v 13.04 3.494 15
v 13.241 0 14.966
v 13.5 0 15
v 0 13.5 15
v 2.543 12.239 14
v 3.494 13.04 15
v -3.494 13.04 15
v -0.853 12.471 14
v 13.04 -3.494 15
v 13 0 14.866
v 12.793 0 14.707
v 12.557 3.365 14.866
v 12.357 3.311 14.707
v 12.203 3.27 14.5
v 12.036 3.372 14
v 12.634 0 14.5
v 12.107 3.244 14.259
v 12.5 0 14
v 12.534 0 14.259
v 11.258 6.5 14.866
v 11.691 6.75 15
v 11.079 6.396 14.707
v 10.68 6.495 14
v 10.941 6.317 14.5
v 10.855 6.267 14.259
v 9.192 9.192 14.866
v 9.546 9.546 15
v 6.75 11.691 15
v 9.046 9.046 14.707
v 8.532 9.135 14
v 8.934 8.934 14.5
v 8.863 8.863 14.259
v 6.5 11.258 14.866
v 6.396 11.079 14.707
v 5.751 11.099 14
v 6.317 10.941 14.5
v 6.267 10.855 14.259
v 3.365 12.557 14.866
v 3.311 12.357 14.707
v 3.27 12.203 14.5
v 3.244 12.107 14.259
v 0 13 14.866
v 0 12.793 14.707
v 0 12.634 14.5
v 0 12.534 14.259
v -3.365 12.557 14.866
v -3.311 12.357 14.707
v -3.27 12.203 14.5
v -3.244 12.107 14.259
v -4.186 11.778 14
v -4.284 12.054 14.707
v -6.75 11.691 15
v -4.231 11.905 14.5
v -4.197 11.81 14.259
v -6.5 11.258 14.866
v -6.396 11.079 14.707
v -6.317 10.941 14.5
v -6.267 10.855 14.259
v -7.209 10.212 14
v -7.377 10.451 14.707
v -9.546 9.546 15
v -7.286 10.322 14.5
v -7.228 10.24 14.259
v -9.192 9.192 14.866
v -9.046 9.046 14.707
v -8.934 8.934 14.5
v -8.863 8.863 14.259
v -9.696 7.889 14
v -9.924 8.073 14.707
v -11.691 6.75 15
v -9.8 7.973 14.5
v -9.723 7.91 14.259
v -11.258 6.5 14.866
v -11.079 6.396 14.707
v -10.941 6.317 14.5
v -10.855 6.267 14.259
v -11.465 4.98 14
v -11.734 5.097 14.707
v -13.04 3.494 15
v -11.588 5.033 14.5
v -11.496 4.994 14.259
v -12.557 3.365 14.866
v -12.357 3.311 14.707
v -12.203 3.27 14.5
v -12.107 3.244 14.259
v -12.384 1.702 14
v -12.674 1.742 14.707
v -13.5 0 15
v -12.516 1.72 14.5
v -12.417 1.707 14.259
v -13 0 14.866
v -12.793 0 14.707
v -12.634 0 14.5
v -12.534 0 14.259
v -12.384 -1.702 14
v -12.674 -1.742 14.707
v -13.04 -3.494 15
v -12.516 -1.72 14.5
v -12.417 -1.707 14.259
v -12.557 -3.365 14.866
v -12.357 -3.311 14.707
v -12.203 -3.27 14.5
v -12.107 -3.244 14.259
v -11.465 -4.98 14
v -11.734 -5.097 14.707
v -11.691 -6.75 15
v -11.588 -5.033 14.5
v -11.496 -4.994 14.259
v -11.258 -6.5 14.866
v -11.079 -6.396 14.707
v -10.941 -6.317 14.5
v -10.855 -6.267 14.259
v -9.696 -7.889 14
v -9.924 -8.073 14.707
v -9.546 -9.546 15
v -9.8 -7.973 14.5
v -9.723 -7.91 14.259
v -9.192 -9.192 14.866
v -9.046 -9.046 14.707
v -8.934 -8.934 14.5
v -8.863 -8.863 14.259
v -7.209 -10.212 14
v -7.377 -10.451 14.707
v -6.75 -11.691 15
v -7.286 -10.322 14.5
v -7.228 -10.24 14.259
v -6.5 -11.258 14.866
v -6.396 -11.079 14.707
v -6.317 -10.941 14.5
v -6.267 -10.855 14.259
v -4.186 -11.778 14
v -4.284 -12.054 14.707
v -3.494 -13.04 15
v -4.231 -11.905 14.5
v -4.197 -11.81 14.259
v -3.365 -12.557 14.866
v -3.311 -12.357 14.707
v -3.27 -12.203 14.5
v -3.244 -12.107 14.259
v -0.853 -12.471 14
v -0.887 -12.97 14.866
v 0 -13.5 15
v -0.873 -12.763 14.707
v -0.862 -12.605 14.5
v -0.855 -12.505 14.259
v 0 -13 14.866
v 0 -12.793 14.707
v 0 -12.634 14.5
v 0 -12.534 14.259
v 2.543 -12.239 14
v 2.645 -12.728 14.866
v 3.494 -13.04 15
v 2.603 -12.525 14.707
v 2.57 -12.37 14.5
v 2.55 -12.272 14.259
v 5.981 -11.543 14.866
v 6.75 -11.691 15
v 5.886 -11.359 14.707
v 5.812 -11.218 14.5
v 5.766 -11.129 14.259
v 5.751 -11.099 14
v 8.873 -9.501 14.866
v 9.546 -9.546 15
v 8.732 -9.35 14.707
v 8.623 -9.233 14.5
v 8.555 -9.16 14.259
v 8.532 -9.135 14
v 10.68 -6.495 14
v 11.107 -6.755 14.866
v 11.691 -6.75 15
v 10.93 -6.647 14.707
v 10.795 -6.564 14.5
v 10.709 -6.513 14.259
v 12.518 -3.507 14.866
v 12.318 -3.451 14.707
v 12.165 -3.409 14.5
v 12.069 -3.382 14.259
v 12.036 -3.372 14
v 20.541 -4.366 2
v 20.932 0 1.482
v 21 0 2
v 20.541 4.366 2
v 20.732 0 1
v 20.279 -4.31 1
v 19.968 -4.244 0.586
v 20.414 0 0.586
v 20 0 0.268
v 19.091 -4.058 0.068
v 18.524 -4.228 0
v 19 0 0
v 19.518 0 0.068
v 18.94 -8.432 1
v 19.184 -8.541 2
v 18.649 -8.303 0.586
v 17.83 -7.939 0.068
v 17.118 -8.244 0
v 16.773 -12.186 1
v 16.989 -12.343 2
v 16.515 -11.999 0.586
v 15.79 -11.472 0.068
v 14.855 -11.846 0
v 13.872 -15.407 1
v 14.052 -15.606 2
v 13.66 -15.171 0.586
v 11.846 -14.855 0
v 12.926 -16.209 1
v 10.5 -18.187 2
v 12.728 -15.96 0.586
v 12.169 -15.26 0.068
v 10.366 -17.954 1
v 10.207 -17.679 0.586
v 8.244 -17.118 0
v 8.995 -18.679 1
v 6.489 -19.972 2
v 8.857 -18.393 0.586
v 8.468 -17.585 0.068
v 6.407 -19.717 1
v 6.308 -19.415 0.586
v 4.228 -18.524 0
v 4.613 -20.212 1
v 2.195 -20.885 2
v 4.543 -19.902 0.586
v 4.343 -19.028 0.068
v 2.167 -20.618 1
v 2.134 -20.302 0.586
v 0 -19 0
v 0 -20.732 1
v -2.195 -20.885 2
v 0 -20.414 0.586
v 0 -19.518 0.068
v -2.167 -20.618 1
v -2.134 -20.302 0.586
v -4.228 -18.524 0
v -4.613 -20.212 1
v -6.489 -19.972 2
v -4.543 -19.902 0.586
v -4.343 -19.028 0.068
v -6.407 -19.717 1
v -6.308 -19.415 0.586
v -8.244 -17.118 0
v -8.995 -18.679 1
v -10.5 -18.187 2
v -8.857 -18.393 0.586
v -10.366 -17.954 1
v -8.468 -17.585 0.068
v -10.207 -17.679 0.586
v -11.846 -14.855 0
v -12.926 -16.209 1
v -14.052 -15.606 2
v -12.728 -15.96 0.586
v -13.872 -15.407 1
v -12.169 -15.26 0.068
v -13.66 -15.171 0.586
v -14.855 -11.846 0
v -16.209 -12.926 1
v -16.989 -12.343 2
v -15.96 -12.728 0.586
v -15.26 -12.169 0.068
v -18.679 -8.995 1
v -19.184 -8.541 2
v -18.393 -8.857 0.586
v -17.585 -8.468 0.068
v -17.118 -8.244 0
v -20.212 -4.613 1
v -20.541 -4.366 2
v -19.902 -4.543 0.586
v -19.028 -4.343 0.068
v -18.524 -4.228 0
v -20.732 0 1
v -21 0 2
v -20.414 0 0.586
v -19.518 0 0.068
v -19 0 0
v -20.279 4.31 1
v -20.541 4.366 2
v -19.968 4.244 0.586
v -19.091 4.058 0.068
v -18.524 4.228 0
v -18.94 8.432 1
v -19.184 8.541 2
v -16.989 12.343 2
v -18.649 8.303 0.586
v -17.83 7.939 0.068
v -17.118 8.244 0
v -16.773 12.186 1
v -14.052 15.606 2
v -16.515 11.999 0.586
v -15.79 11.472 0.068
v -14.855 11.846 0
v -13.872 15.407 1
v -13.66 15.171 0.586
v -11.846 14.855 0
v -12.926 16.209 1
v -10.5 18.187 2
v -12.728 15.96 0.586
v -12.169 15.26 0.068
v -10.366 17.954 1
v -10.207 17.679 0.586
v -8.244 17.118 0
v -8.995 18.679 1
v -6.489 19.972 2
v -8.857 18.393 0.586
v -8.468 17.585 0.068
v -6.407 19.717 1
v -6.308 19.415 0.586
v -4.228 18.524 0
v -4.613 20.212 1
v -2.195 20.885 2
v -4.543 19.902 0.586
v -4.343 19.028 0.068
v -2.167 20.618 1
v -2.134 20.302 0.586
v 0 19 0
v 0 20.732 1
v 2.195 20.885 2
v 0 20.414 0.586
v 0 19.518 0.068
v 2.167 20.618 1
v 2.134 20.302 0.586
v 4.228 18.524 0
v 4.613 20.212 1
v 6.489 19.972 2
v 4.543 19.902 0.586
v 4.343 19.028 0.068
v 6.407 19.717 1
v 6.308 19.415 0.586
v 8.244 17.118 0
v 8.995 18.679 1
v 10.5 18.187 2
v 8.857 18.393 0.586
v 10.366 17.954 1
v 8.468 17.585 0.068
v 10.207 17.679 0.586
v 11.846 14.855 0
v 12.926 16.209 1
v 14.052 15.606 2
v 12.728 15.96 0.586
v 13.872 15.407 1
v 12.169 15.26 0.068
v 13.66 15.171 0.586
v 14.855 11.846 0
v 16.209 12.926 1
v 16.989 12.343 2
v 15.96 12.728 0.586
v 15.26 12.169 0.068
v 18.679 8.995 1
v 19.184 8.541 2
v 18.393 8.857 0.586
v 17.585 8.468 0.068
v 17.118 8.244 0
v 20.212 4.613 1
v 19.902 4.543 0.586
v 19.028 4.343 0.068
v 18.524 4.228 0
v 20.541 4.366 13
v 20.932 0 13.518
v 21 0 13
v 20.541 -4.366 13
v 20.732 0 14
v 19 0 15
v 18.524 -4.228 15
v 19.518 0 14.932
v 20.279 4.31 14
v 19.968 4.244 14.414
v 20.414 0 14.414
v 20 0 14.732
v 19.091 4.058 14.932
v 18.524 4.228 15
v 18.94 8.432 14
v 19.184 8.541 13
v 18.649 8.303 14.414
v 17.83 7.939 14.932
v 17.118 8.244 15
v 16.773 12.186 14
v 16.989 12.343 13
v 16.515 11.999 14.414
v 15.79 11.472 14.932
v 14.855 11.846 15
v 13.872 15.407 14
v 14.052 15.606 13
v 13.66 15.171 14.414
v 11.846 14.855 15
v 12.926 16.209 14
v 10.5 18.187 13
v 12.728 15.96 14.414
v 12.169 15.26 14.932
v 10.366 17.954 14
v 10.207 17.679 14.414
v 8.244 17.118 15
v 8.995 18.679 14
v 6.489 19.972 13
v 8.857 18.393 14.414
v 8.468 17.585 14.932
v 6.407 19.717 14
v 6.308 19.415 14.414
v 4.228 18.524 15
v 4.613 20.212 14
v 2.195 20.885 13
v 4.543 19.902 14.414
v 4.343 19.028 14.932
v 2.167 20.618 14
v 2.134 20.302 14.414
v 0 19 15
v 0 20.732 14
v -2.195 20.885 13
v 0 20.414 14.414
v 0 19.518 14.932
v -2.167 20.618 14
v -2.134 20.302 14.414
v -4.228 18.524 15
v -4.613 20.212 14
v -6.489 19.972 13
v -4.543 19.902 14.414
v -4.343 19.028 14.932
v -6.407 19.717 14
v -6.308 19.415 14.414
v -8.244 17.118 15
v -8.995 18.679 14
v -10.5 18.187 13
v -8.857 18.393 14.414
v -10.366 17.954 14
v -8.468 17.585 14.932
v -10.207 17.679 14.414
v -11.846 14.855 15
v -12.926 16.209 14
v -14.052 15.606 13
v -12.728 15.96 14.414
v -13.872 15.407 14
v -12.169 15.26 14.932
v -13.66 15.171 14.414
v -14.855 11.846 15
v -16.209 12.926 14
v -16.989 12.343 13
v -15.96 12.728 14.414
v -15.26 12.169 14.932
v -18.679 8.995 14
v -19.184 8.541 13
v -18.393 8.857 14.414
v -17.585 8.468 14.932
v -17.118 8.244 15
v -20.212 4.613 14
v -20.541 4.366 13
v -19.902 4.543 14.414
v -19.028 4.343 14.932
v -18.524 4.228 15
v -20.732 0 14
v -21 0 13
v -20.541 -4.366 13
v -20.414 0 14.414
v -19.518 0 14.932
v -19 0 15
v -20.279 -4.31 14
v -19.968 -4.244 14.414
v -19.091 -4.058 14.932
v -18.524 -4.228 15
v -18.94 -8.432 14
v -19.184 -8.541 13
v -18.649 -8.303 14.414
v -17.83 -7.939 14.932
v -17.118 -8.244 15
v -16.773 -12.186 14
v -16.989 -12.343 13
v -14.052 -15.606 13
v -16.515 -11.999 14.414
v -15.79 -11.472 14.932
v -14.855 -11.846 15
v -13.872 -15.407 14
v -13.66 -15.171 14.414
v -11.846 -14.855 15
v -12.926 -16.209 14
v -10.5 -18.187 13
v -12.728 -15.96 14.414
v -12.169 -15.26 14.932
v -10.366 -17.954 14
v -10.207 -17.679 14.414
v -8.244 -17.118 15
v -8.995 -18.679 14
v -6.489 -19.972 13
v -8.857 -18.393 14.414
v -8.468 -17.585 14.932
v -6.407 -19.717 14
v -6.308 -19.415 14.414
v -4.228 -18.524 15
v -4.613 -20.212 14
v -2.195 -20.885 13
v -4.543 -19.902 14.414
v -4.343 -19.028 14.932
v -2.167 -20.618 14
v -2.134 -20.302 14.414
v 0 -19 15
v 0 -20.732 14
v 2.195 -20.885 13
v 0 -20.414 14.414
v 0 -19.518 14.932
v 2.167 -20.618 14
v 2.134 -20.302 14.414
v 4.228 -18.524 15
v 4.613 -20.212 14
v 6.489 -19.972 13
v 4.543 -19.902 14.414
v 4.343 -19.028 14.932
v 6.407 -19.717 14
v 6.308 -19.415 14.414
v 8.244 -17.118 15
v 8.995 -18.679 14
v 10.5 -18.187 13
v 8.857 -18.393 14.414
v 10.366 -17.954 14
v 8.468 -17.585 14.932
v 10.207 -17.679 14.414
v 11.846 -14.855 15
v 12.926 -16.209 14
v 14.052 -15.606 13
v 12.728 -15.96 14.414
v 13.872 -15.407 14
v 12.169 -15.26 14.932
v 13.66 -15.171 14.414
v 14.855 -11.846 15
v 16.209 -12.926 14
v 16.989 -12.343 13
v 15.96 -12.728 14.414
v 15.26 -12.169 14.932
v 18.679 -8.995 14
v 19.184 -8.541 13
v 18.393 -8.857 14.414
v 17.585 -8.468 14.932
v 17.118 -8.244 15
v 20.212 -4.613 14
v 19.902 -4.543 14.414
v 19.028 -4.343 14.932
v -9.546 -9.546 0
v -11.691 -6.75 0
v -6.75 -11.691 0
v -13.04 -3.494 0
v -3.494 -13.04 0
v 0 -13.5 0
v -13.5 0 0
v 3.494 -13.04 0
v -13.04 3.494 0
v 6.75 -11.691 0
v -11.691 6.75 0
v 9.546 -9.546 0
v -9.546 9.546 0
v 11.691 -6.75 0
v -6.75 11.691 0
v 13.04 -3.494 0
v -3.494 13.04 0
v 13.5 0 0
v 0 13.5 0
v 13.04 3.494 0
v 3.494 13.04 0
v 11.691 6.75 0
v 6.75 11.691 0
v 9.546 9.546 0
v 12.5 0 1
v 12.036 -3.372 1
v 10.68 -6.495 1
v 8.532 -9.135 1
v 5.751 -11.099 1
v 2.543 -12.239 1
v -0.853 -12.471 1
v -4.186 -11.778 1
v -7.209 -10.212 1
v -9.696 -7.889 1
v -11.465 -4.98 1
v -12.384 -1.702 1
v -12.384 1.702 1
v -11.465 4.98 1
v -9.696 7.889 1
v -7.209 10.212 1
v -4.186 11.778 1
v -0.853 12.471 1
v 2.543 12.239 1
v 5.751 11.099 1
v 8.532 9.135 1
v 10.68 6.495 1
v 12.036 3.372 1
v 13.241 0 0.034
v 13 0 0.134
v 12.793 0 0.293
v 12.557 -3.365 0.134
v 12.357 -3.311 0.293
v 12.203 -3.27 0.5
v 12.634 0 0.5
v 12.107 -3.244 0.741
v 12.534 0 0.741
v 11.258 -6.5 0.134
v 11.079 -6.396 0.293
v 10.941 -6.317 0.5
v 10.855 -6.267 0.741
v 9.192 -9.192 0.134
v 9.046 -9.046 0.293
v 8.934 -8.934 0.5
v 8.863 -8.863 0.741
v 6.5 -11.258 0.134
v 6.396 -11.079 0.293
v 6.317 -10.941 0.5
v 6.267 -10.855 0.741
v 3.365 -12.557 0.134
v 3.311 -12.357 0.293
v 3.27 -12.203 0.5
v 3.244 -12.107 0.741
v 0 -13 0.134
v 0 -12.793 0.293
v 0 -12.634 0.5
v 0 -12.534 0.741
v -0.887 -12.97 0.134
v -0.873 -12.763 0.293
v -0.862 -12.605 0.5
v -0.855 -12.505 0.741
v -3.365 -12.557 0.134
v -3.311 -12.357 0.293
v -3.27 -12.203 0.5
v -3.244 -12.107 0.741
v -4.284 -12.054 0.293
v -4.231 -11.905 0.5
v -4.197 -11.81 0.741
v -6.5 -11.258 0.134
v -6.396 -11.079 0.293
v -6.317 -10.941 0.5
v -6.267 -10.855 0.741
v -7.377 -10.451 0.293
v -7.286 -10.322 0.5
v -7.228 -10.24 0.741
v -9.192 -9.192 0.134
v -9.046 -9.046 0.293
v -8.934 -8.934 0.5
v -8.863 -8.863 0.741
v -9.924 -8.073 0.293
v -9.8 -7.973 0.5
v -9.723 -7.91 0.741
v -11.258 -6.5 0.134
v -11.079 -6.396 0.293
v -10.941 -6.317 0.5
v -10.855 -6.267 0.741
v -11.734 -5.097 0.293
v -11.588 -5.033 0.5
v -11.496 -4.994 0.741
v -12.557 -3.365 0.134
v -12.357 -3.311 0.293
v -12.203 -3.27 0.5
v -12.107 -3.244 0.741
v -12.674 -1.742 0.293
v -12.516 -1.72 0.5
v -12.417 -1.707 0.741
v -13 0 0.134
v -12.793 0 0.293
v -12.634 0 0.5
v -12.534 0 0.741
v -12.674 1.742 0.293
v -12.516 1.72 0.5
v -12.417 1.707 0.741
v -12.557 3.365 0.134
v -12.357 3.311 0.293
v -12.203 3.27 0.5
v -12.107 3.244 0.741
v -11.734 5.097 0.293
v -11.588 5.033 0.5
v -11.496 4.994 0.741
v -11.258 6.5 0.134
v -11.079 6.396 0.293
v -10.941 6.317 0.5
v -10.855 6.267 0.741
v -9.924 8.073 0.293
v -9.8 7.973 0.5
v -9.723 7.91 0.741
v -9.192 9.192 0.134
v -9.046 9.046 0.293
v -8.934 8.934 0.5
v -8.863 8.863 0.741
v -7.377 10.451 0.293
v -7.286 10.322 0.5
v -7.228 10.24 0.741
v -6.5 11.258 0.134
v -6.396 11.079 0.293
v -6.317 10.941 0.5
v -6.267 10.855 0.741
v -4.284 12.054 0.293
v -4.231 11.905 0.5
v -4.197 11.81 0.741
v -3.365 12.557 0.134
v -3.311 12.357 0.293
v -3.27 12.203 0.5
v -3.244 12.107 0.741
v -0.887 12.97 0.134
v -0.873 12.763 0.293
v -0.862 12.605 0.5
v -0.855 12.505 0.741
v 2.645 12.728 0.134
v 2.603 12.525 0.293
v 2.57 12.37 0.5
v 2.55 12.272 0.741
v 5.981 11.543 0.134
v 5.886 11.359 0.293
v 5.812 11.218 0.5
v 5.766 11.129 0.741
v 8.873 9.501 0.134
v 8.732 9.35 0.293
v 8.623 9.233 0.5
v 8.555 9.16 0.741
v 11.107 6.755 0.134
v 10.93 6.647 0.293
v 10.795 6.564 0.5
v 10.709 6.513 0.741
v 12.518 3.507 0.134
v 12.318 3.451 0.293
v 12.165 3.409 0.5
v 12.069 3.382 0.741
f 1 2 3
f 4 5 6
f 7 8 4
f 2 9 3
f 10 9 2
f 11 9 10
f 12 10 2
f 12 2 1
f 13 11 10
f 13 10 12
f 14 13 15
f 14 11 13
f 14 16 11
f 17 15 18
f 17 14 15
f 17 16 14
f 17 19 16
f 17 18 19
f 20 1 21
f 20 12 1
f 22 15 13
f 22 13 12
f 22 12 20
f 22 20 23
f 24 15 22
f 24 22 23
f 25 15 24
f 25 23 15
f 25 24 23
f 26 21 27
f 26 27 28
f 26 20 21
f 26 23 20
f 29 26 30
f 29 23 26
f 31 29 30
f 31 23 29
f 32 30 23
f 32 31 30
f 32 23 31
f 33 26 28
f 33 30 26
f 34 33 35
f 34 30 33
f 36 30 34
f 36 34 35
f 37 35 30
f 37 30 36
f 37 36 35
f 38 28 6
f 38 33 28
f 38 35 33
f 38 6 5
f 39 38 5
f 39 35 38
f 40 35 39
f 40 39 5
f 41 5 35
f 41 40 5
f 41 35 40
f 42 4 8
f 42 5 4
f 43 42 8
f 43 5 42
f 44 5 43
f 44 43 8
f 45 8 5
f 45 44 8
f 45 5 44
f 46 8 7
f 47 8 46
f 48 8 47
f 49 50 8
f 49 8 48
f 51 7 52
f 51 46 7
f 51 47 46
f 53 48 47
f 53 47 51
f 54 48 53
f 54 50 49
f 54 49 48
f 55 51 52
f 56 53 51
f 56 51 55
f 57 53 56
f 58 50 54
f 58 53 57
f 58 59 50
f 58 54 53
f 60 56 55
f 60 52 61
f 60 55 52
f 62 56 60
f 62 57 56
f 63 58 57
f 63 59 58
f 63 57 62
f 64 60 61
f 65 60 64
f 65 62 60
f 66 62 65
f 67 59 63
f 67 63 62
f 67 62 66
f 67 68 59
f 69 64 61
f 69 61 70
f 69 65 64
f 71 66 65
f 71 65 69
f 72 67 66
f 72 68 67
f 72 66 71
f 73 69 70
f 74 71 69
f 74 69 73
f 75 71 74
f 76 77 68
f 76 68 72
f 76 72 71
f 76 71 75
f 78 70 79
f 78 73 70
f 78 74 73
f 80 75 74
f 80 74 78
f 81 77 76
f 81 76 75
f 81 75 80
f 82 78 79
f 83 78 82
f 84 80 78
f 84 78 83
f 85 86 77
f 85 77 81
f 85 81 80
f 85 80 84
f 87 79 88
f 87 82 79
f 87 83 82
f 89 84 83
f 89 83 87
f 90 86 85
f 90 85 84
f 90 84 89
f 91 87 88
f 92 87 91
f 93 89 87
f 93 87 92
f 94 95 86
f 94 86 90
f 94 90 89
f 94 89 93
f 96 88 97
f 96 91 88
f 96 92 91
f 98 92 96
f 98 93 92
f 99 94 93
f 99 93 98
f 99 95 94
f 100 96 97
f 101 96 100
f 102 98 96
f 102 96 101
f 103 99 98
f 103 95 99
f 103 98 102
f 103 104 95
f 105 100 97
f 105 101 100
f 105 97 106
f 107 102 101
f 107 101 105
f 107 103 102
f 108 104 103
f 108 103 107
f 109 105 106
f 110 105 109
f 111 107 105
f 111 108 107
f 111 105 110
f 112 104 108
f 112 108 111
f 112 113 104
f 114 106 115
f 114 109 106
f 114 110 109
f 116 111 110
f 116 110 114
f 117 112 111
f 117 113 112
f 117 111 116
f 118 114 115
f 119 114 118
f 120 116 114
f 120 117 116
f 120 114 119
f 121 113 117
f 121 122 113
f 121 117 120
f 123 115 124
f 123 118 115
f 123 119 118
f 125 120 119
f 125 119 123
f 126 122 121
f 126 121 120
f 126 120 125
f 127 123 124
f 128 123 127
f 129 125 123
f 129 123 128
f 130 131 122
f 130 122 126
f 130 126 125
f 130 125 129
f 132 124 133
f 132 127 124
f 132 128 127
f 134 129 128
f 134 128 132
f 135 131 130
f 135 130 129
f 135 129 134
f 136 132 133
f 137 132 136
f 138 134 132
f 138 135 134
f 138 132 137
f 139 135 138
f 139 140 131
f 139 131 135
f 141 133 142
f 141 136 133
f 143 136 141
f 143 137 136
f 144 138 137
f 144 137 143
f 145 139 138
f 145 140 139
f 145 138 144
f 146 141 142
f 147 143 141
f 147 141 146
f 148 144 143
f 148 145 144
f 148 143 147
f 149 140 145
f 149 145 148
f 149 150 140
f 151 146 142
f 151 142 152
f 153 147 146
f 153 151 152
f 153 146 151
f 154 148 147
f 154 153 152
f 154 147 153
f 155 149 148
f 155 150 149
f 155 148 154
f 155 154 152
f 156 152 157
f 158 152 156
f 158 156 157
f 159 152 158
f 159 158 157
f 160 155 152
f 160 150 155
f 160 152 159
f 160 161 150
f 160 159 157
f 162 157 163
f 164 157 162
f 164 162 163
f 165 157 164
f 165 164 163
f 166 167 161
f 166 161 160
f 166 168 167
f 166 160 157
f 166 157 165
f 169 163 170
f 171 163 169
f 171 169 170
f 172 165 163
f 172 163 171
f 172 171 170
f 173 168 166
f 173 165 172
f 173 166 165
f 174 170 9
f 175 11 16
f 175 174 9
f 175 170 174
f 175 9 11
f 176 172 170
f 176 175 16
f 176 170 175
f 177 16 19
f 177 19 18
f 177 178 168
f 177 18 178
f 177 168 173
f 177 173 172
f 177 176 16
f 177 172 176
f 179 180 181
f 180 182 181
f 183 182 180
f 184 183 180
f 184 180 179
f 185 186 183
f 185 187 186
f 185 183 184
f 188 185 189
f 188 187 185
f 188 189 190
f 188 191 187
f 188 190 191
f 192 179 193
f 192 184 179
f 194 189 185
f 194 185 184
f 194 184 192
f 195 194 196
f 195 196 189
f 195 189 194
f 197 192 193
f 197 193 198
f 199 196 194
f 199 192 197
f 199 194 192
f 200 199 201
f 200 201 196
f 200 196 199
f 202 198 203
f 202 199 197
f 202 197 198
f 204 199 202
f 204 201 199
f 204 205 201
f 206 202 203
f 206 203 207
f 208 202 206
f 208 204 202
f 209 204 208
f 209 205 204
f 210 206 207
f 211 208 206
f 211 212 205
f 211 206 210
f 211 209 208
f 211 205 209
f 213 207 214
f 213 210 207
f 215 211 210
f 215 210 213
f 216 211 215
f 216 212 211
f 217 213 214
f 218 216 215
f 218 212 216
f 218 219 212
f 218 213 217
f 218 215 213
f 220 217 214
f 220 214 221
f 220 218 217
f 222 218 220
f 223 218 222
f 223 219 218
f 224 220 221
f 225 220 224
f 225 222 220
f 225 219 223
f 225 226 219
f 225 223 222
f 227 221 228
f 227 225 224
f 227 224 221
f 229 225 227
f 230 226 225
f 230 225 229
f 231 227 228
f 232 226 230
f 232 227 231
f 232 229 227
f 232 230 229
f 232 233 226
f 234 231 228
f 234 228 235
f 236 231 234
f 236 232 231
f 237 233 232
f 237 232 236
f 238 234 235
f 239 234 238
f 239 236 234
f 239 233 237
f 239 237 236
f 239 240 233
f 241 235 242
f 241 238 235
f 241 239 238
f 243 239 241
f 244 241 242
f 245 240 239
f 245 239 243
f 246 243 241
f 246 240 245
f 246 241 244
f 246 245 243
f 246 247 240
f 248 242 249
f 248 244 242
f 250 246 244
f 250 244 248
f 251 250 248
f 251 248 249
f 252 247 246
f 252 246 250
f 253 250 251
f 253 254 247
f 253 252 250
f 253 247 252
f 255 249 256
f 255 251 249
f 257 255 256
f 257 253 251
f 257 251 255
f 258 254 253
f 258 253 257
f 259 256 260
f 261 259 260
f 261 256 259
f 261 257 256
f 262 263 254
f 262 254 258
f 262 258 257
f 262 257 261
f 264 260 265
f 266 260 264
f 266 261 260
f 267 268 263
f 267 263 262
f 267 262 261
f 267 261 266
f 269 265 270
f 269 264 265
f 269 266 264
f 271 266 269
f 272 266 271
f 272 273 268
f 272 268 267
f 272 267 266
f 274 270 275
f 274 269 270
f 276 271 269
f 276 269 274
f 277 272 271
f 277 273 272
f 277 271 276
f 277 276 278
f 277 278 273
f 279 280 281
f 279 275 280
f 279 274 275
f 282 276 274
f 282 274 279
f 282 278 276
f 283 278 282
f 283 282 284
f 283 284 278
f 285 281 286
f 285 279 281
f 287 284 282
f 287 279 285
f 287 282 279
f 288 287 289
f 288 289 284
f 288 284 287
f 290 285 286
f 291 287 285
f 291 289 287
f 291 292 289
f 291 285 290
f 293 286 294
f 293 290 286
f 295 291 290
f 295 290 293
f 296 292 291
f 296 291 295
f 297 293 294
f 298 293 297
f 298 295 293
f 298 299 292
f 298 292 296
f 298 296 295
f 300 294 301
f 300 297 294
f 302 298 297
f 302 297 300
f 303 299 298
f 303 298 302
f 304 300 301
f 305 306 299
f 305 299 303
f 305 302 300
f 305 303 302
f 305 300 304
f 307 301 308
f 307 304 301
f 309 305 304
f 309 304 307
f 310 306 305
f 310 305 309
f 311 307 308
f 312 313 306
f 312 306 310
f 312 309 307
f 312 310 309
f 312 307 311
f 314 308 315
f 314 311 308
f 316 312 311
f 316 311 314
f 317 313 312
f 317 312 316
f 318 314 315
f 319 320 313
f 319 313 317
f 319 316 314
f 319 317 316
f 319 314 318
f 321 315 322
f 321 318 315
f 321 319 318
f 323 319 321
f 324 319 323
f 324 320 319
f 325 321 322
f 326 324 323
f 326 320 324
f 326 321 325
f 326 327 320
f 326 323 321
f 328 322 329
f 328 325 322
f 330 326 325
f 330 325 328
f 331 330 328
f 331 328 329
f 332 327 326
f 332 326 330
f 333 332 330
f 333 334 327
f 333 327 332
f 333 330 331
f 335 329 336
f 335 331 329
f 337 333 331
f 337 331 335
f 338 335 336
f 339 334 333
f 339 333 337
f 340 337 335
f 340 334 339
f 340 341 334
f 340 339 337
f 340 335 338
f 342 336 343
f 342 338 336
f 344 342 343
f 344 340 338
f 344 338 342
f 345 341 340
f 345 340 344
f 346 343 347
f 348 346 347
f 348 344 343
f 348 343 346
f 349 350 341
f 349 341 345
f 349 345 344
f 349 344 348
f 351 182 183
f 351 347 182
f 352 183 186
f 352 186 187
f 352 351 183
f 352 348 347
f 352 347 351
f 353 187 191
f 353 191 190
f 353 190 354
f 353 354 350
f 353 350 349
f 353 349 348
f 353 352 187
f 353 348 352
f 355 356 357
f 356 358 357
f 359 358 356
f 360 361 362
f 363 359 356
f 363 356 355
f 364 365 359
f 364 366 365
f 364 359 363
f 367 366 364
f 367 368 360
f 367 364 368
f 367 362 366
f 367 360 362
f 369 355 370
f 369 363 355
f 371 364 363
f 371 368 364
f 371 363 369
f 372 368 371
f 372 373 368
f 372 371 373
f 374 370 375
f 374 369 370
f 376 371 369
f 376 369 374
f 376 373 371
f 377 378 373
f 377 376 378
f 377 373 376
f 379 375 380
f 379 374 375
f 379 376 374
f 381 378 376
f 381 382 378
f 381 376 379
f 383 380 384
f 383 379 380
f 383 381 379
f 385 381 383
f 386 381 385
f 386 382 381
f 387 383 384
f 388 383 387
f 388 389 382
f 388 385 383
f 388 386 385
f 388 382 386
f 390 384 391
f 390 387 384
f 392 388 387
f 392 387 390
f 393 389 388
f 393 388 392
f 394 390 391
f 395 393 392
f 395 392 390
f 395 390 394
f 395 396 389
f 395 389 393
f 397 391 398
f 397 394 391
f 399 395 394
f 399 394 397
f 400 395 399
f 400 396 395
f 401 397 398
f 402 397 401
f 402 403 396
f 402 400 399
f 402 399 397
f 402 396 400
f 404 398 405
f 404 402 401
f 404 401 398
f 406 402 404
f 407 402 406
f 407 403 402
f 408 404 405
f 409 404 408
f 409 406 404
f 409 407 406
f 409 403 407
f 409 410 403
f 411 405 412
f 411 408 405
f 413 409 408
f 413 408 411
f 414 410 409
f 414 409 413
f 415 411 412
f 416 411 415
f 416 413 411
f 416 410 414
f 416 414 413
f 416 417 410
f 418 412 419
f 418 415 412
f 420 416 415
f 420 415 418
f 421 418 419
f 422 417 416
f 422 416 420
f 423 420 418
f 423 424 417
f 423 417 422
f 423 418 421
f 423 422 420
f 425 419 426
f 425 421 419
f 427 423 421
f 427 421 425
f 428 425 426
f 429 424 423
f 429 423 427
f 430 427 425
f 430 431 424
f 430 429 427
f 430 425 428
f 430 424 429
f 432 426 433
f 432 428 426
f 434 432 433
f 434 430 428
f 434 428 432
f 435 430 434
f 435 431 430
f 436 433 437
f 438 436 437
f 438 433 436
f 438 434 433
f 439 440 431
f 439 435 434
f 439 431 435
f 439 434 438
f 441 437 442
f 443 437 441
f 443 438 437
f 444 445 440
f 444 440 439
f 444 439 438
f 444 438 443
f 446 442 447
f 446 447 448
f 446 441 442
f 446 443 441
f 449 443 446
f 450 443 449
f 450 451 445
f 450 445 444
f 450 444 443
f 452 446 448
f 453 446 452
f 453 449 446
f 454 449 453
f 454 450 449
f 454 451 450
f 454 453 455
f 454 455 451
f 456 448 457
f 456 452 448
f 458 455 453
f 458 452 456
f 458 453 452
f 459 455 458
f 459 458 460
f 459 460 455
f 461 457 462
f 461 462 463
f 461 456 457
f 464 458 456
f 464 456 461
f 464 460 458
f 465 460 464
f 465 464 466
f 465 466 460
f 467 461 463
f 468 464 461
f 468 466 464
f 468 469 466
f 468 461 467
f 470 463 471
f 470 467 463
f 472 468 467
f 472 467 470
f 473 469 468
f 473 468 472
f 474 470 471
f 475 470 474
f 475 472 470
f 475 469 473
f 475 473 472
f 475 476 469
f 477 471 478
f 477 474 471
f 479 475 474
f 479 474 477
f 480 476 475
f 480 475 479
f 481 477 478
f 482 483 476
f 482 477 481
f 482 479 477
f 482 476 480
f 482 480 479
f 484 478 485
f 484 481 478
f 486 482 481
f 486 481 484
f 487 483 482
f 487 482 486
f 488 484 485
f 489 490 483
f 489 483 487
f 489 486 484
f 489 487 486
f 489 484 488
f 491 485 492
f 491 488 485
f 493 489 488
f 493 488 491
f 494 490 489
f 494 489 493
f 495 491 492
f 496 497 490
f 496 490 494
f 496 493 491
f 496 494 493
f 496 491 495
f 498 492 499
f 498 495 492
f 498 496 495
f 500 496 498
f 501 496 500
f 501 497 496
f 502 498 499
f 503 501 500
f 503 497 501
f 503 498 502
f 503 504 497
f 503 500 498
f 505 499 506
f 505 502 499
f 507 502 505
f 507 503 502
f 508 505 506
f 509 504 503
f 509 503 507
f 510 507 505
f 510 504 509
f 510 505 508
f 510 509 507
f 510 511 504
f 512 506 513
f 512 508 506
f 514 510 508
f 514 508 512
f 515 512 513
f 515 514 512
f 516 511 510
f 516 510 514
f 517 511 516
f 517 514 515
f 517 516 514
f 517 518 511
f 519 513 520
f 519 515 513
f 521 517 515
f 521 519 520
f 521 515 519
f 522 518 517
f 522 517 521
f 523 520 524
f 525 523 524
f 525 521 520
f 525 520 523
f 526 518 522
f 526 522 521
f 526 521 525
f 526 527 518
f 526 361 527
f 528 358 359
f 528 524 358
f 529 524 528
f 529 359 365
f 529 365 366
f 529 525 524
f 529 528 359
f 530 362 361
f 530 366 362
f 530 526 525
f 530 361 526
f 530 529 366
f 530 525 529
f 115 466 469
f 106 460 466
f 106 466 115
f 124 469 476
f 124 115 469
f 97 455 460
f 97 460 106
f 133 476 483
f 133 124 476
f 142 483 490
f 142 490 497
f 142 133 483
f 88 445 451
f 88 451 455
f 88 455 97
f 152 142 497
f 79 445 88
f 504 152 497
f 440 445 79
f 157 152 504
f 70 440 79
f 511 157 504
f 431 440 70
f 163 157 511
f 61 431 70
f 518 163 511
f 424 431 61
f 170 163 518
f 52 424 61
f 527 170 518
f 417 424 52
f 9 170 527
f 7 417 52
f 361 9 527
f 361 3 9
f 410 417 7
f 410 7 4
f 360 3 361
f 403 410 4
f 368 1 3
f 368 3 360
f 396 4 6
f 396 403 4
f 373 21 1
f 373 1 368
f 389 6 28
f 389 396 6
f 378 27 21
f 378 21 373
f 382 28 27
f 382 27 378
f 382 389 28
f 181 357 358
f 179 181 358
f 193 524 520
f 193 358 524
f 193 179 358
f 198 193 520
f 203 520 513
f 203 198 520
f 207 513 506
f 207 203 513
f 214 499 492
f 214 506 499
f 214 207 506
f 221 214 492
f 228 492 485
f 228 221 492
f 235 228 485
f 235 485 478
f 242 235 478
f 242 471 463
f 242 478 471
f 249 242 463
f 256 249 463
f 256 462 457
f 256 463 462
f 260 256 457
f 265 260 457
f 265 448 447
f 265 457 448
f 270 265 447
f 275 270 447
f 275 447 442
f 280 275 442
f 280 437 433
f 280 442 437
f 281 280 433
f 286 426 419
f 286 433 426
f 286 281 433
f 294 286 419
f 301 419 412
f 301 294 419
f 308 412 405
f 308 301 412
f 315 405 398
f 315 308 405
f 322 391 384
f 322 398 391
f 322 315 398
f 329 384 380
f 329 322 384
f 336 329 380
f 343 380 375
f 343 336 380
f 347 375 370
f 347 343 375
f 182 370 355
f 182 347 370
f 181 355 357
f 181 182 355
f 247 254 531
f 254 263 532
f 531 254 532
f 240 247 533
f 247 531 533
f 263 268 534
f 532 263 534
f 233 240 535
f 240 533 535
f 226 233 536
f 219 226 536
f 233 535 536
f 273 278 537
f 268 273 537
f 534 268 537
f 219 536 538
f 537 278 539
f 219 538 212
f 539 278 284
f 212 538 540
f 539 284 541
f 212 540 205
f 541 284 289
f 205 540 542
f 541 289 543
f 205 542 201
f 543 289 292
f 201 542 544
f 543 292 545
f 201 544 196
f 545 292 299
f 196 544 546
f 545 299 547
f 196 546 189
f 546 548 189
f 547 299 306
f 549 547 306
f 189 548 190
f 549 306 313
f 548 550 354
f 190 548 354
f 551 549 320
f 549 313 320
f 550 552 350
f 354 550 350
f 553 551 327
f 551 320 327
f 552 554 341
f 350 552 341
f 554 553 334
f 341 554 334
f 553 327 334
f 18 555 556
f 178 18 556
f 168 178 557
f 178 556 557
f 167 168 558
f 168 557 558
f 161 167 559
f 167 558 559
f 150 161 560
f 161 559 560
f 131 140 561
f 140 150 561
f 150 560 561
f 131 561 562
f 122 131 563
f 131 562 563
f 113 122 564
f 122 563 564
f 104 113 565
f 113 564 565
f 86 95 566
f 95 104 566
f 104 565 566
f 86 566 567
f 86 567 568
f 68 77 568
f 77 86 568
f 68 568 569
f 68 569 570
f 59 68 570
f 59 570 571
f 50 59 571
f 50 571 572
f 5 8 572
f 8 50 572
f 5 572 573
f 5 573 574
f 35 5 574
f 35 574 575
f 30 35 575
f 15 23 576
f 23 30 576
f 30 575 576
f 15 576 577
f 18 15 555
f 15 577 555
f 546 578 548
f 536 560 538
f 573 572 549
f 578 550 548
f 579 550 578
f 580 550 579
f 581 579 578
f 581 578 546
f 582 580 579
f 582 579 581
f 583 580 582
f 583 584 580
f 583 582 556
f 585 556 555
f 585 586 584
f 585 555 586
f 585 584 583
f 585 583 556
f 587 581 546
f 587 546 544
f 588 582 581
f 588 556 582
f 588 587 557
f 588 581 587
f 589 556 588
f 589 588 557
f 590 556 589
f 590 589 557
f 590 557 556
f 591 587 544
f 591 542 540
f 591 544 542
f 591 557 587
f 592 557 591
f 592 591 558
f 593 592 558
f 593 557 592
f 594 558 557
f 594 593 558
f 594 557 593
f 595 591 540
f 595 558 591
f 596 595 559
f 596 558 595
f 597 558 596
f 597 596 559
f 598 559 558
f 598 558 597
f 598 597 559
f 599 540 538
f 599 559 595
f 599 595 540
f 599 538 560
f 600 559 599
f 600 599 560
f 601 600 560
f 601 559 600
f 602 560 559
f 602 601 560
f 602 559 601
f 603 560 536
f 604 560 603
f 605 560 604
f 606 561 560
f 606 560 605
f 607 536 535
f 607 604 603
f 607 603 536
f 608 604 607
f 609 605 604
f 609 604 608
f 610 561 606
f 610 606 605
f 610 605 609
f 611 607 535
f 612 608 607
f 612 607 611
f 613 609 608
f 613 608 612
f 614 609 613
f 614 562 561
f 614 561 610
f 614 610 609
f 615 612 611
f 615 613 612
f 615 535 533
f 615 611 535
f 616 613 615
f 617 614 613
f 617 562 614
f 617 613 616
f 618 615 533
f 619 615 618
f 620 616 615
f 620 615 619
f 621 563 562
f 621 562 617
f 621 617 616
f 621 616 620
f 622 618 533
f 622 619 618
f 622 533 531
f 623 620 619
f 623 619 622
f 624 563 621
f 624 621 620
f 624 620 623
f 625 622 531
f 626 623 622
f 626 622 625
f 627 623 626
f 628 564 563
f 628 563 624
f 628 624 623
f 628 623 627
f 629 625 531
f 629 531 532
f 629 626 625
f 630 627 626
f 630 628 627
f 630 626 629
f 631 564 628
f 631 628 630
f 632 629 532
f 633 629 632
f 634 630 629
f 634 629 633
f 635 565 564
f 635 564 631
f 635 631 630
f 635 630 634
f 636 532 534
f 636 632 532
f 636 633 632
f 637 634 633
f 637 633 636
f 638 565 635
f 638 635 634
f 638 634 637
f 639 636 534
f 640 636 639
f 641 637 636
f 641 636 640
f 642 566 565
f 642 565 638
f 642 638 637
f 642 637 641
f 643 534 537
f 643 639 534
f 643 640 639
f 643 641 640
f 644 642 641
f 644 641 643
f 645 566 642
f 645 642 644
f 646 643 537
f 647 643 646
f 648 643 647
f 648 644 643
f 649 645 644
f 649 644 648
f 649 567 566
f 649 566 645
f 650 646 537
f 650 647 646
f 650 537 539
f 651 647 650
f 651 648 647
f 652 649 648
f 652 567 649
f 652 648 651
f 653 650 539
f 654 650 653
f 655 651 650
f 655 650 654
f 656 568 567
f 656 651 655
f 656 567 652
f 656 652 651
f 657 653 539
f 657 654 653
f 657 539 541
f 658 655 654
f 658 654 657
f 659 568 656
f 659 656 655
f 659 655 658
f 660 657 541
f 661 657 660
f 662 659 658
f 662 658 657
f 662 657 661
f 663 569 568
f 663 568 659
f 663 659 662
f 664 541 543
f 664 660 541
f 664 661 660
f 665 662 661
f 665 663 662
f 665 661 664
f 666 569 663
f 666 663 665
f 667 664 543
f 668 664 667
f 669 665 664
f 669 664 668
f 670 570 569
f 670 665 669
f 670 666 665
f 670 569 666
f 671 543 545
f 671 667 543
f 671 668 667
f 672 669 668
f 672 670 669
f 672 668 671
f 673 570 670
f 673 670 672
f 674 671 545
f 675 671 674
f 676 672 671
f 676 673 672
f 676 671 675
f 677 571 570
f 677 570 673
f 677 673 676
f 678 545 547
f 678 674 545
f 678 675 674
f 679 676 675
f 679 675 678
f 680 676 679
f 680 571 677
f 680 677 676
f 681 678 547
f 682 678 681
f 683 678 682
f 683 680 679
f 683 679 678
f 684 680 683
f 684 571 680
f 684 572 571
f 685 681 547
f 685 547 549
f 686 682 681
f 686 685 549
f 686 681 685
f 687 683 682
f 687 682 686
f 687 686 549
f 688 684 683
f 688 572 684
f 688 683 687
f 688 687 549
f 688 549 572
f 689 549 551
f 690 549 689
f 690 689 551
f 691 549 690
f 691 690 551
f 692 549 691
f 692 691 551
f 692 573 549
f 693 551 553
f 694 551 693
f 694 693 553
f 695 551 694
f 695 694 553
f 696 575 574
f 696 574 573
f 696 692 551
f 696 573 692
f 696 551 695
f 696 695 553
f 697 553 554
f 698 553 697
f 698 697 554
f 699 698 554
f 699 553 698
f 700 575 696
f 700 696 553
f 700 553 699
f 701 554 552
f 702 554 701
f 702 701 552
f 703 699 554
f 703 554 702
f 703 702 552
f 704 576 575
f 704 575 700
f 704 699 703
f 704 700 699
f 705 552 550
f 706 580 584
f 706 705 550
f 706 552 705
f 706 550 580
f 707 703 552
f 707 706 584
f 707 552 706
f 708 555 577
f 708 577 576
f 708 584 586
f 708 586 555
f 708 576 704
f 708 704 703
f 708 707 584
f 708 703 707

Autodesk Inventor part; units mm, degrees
ref_plane "YZ Plane" through (0, 0, 0) normal (1, 0, 0) x (0, 1, 0)
ref_plane "XZ Plane" through (0, 0, 0) normal (0, 1, 0) x (-1, 0, 0)
ref_plane "XY Plane" through (0, 0, 0) normal (0, 0, 1) x (1, 0, 0)
sketch "Sketch1" plane through (0, 0, 0) normal (0, 0, 1) x (1, 0, 0)
  circle A0 centre (0, 0) radius 12.5
  circle A1 centre (0, 0) radius 21
  dimension "d0" = 25
  dimension "d1" = 42
extrude "Extrusion1" add sketch "Sketch1" along normal blind 15
fillet "Fillet1" radius 2 2 edges at (-21, 0, 15) (-21, 0, 0)
fillet "Fillet2" radius 1 2 edges at (-12.5, 0, 0) (-12.5, 0, 15)
properties part number "U51105" material "Steel, Carbon"
